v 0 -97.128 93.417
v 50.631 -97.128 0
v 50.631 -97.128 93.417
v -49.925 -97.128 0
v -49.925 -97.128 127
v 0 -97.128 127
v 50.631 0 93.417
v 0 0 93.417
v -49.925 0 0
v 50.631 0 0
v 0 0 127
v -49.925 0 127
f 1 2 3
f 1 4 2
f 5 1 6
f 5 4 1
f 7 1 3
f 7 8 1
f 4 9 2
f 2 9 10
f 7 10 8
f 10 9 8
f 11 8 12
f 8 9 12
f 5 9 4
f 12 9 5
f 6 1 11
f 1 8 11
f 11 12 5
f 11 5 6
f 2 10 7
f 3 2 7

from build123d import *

# Parameters (mm, degrees)
F0_W     = 49.9249994755
F0_H     = 71.728259325
F1_DEPTH = 127
F2_W     = 71.728259325
F2_H     = 93.4169888496
F3_DEPTH = 50.6314188242
F4_DEPTH = 25.4


with BuildPart() as f1:
    # F0 (on Top) → F1 (new body)
    with BuildSketch(Plane.XY):
        with Locations((-24.9624997377, -35.8641296625)):
            Rectangle(F0_W, F0_H)
    extrude(amount=F1_DEPTH)

    # F2 (on face) → F3 (join)
    with BuildSketch(Plane.YZ):
        with Locations((-35.8641296625, 46.7084944248)):
            Rectangle(F2_W, F2_H)
    extrude(amount=F3_DEPTH)

    # F4 (add): a face of the model
    f4_faces = [f1.faces().sort_by_distance(p)[0] for p in [
        (-3.4809309458, -71.728259325, 56.3257611352),
    ]]
    extrude(f4_faces, amount=F4_DEPTH)


solid = f1.part
